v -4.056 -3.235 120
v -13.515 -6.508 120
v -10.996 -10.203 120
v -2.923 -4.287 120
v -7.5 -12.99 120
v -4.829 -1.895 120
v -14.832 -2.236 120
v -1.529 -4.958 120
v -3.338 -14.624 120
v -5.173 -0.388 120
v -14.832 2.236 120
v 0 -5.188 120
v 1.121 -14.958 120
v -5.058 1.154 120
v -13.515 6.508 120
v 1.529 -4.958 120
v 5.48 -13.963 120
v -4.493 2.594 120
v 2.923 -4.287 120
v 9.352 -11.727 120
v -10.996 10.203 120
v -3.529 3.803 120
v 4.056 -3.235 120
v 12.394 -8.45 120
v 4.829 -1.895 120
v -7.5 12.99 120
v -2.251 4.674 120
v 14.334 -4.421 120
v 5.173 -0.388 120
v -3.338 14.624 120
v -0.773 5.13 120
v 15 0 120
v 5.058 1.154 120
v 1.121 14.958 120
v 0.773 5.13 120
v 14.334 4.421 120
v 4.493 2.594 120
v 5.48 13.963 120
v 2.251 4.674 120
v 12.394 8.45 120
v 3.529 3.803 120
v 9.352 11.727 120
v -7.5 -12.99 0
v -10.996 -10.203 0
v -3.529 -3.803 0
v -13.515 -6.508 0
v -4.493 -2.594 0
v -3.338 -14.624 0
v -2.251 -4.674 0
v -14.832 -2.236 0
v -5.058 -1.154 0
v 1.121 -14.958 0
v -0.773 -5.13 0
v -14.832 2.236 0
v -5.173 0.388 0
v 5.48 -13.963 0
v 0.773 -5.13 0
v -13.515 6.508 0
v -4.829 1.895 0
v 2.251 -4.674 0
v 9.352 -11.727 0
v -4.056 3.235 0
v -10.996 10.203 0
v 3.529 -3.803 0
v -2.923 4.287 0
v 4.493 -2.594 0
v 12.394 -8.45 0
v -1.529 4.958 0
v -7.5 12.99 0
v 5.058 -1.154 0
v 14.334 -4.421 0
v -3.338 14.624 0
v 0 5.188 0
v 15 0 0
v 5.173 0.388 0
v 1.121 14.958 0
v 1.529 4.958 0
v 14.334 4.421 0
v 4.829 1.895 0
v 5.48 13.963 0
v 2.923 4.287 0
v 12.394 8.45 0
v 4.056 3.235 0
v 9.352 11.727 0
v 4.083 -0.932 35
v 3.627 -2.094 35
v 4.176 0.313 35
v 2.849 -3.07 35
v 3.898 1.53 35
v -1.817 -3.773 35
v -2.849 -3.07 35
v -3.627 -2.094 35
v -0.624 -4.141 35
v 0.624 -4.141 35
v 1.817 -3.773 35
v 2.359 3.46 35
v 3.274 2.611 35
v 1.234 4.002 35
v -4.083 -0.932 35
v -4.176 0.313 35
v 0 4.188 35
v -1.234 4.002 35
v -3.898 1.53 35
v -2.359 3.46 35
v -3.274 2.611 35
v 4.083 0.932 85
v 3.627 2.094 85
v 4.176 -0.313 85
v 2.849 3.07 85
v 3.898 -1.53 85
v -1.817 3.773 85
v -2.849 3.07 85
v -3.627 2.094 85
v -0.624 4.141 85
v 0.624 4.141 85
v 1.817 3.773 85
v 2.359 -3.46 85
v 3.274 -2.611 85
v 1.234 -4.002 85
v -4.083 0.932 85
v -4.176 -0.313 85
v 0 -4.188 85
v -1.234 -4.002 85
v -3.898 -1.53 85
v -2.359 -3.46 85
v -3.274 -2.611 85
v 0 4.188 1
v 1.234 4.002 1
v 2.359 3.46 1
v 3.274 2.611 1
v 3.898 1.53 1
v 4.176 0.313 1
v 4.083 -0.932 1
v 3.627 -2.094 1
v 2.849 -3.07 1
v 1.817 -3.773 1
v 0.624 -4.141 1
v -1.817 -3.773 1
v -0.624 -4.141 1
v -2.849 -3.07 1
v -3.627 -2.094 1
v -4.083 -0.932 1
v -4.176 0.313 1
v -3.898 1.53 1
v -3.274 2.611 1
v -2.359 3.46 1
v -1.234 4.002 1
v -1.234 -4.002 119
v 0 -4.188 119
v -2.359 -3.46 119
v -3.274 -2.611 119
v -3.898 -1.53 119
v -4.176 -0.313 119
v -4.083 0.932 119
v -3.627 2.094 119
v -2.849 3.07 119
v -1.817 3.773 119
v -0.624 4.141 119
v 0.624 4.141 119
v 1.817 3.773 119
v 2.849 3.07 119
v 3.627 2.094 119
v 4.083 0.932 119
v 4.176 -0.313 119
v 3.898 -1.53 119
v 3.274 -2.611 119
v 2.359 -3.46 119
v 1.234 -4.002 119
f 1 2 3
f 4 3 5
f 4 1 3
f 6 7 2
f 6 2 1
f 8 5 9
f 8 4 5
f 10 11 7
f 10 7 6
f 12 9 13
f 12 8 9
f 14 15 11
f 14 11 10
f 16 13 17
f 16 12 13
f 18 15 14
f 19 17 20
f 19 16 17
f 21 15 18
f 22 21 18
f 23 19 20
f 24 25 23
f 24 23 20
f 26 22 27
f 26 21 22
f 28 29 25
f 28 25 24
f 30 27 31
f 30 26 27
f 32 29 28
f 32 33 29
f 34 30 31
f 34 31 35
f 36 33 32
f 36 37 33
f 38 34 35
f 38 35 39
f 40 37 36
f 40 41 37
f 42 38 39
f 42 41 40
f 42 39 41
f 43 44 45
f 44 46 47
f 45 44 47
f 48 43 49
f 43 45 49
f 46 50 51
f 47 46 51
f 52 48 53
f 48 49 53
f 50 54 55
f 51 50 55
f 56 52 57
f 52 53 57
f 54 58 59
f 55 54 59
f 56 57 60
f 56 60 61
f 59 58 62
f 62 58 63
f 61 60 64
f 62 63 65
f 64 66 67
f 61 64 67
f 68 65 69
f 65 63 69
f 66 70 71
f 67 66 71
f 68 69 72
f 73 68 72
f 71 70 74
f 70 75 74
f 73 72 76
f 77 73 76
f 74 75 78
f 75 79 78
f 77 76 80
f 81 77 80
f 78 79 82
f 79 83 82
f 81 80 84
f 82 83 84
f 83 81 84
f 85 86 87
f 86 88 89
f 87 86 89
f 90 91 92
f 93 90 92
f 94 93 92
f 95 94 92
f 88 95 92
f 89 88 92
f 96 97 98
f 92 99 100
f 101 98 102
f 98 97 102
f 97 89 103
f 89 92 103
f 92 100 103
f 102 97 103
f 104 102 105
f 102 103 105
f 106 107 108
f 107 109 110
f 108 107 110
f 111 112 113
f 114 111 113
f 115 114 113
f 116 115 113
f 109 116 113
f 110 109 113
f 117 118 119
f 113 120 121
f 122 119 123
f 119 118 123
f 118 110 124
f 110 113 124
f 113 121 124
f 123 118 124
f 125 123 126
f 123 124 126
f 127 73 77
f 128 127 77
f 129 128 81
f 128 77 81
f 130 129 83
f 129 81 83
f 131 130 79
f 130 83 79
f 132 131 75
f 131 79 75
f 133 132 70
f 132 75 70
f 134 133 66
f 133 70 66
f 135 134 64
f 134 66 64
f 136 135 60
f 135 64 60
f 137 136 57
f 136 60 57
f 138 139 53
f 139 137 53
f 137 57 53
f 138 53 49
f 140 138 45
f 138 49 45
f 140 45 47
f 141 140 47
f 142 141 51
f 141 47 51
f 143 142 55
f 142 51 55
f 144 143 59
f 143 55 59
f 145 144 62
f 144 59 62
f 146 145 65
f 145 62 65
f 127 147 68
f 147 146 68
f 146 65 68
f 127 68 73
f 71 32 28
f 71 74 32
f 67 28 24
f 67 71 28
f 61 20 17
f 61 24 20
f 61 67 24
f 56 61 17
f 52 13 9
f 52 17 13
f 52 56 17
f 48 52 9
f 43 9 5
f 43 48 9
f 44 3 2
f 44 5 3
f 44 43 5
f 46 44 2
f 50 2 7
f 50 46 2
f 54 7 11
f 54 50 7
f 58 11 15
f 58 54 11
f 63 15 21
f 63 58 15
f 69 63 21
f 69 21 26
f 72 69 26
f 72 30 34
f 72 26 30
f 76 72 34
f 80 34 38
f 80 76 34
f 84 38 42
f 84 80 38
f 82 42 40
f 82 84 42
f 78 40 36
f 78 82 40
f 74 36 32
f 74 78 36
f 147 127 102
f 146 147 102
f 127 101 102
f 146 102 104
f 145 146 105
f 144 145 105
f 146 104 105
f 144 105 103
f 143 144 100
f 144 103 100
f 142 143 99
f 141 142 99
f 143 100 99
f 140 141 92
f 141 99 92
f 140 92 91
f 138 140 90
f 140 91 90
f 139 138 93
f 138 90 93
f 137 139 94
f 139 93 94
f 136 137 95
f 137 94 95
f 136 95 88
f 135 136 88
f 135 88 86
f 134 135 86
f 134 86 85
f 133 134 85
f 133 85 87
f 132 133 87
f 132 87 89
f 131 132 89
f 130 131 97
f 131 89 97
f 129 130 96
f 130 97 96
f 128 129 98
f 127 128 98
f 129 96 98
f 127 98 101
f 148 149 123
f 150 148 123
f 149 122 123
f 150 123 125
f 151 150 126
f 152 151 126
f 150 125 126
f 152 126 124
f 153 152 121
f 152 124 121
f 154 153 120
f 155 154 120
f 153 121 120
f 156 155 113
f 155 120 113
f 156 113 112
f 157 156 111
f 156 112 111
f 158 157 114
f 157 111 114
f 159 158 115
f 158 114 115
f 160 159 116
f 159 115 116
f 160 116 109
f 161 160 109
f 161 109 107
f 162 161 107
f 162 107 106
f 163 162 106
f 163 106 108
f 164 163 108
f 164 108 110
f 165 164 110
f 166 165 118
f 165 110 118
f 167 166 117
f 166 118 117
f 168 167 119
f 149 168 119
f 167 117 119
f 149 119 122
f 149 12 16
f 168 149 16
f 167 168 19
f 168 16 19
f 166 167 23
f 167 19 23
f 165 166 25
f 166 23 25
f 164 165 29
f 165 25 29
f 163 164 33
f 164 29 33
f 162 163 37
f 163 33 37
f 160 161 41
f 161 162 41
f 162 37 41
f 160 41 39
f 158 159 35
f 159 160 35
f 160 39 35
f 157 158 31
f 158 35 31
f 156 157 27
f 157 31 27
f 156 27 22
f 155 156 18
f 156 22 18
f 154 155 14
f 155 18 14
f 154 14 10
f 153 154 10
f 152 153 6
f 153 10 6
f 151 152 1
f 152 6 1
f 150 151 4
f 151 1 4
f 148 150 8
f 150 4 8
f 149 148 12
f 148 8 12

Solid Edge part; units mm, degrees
sketch "Sketch1" plane through (0, 0, 0) normal (0, 0, 1) x (1, 0, 0)
  circle A0 centre (0, 0) radius 15
extrude "Protrusion1" add sketch "Sketch1" along normal blind 120
hole "Gewinde_oben" at (0, 0, 120) direction (0, 0, -1) diameter 8.376 depth 35 start chamfer 1 start chamfer angle 45
hole "Gewinde_unten" at (0, 0, 0) direction (0, 0, 1) diameter 8.376 depth 35 start chamfer 1 start chamfer angle 45
